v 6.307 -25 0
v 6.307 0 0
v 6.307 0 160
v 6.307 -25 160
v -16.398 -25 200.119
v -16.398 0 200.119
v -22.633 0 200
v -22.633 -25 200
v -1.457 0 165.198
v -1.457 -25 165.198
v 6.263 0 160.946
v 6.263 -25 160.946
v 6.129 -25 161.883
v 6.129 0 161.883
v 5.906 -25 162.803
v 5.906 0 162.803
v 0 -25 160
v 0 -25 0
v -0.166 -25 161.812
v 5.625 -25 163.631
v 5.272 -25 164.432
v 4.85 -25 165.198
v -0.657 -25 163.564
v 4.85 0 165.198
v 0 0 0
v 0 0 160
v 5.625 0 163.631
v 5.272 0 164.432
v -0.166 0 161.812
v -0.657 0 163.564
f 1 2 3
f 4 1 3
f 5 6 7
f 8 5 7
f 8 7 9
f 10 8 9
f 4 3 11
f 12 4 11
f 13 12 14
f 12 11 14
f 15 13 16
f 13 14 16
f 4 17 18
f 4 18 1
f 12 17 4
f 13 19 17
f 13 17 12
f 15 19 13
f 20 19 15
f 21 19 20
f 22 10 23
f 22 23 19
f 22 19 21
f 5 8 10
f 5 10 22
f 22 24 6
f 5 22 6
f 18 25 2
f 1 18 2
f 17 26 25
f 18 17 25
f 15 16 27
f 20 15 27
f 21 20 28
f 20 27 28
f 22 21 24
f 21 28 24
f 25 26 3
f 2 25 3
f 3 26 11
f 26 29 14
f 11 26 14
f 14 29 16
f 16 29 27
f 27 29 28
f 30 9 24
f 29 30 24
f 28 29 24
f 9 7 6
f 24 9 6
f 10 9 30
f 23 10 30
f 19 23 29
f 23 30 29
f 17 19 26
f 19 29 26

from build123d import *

# Parameters (mm, degrees)
F1_DEPTH = 25


with BuildPart() as f1:
    # F0 (on Front) → F1 (new body)
    with BuildSketch(Plane.XZ):
        with BuildLine():
            ThreePointArc((-1.457142, 165.198036), (-0.371174, 162.699206), (0, 160))
            Line((0, 160), (0, 0))
            Line((0, 0), (6.307421, 0))
            Line((6.307421, 0), (6.307421, 160))
            ThreePointArc((6.307421, 160), (6.206676, 161.415892), (5.906471, 162.803255))
            ThreePointArc((5.906471, 162.803255), (5.457063, 164.03535), (4.850279, 165.198036))
            Line((4.850279, 165.198036), (-16.398177, 200.119405))
            Line((-16.398177, 200.119405), (-22.632944, 200))
            Line((-22.632944, 200), (-1.457142, 165.198036))
        make_face()
    extrude(amount=F1_DEPTH)


solid = f1.part
